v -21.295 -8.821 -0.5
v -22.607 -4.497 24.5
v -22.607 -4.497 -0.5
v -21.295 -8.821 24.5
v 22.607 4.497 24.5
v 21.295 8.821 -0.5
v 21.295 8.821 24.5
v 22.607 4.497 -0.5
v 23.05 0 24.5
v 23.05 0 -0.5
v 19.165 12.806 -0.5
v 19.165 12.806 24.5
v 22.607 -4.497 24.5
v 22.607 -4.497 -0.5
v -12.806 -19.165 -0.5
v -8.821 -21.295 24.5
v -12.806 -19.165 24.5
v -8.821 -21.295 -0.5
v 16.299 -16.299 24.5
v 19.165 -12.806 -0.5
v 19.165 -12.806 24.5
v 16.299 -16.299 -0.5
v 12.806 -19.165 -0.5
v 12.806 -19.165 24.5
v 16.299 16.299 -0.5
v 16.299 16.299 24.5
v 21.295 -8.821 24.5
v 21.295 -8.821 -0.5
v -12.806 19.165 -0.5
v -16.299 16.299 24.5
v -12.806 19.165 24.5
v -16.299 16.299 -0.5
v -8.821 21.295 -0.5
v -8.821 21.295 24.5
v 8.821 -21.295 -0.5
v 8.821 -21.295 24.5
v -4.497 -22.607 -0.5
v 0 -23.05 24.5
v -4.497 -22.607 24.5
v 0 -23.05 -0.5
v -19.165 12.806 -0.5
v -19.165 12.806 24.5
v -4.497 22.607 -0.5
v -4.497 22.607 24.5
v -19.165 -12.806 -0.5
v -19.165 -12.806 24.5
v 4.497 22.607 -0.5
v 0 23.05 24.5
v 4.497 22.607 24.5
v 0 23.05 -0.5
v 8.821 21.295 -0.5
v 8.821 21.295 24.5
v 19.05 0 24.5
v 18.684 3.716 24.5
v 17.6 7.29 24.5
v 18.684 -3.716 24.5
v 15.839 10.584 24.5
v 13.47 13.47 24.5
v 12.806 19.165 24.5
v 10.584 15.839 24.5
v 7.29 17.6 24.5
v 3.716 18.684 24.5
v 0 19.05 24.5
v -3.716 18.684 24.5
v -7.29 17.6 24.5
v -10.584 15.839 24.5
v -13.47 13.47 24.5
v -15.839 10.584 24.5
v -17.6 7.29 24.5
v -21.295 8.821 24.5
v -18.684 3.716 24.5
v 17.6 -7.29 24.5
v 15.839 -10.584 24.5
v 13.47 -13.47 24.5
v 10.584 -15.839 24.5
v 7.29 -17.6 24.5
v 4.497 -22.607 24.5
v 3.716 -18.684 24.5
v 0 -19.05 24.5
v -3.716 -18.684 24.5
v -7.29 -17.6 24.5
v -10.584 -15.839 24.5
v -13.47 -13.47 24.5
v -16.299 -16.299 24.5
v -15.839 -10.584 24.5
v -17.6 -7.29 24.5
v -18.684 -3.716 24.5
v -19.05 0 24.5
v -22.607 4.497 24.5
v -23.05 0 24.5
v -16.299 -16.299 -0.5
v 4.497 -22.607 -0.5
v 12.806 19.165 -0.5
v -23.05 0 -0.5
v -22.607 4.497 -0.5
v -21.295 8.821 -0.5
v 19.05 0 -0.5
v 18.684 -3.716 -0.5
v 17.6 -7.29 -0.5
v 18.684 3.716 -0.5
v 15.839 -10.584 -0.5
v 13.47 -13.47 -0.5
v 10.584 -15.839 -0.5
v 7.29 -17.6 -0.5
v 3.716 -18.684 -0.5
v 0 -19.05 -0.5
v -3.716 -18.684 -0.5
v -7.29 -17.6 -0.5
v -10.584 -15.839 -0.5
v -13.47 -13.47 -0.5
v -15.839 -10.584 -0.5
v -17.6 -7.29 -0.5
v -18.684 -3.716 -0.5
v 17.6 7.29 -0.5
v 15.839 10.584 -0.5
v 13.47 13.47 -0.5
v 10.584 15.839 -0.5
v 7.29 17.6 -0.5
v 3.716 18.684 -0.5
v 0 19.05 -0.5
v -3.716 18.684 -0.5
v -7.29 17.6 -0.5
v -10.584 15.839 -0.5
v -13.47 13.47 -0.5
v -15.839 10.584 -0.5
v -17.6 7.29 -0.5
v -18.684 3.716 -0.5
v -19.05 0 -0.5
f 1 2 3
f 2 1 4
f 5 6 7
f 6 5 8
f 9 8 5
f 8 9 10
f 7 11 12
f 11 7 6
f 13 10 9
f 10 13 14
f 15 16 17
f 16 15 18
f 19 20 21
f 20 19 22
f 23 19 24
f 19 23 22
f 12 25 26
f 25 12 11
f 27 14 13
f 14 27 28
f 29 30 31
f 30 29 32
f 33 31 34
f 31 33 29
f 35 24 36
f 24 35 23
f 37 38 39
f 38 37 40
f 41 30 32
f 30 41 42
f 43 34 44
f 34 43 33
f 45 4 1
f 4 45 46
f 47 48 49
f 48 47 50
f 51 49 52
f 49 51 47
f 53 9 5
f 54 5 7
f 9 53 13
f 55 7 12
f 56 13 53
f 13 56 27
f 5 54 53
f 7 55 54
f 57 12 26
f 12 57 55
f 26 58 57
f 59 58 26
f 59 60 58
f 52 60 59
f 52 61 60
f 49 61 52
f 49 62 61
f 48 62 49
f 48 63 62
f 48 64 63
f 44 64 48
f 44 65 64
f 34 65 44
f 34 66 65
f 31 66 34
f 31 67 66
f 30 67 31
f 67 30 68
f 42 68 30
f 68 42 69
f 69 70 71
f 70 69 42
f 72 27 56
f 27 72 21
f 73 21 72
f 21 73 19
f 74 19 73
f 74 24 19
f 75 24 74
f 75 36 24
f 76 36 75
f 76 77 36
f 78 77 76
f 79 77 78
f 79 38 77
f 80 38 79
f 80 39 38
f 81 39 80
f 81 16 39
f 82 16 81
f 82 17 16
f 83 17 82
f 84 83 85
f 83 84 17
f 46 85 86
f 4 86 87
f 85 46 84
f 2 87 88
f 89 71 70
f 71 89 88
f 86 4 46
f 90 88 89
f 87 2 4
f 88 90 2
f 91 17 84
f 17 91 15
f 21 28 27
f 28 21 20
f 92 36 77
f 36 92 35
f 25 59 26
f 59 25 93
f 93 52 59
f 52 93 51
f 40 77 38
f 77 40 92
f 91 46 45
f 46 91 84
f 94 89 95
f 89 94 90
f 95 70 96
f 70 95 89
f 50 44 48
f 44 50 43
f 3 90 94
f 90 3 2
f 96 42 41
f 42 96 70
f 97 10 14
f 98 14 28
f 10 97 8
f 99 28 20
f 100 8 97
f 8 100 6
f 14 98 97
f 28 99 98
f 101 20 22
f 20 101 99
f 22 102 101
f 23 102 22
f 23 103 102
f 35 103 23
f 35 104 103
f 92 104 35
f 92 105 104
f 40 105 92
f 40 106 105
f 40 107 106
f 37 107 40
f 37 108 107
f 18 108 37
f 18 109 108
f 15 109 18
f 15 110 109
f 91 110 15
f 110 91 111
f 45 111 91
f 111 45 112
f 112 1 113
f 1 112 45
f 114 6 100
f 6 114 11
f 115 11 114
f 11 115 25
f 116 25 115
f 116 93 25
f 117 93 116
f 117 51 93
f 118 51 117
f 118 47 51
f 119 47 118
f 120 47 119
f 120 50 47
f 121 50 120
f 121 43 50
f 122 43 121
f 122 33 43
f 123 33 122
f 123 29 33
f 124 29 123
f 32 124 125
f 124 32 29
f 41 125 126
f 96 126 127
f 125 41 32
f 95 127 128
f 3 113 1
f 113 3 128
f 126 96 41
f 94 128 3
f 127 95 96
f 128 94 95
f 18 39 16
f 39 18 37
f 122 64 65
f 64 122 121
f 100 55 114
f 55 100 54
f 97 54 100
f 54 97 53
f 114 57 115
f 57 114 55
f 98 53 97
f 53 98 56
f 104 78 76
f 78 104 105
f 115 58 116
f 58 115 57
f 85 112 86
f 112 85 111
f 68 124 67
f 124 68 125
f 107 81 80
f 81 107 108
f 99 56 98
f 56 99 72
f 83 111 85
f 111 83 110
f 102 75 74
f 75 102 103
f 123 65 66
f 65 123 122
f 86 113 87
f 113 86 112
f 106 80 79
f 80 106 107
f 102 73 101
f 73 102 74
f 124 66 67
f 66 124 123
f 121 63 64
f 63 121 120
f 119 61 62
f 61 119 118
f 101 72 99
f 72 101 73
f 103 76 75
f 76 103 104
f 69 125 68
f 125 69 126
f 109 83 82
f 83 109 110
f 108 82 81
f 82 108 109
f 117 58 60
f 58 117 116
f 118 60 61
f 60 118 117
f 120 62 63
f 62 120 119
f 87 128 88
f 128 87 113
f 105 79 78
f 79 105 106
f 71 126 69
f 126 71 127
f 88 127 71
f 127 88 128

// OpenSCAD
$fn = 32;

// ----------------------------------------------------------------------
// Two-module gear rim: z12 m2 and z28 m1.2, 24 mm wide
// ----------------------------------------------------------------------

// --- parameters (mm) ---
module_a = 2;             // first tooth module
teeth_a = 12;             // first band tooth count
module_b = 1.2;           // second tooth module
teeth_b = 28;             // second band tooth count
band_h = 10;              // height of one tooth band
web_t = 4;                // web thickness between the bands
total = 24;               // overall width over both bands
root_r = 9.5;             // root radius of the coarse band
hub_r = 23.05;            // hub radius
bore_d = 38.1;            // hub bore
hole_count = 5;           // lightening holes
hole_r = 7.75;            // lightening hole circle radius
hole_d = 4;               // lightening hole diameter

band_a = [[9.4, -1.378], [12.124, -1.51], [13.058, -1.154], [13.986, -0.621], [13.986, 0.621], [13.058, 1.154], [12.124, 1.51], [9.4, 1.378], [8.829, 3.507], [11.254, 4.755], [11.885, 5.53], [12.423, 6.456], [11.802, 7.531], [10.732, 7.528], [9.745, 7.369], [7.451, 5.893], [5.893, 7.451], [7.369, 9.745], [7.528, 10.732], [7.531, 11.802], [6.456, 12.423], [5.53, 11.885], [4.755, 11.254], [3.507, 8.829], [1.378, 9.4], [1.51, 12.124], [1.154, 13.058], [0.621, 13.986], [-0.621, 13.986], [-1.154, 13.058], [-1.51, 12.124], [-1.378, 9.4], [-3.507, 8.829], [-4.755, 11.254], [-5.53, 11.885], [-6.456, 12.423], [-7.531, 11.802], [-7.528, 10.732], [-7.369, 9.745], [-5.893, 7.451], [-7.451, 5.893], [-9.745, 7.369], [-10.732, 7.528], [-11.802, 7.531], [-12.423, 6.456], [-11.885, 5.53], [-11.254, 4.755], [-8.829, 3.507], [-9.4, 1.378], [-12.124, 1.51], [-13.058, 1.154], [-13.986, 0.621], [-13.986, -0.621], [-13.058, -1.154], [-12.124, -1.51], [-9.4, -1.378], [-8.829, -3.507], [-11.254, -4.755], [-11.885, -5.53], [-12.423, -6.456], [-11.802, -7.531], [-10.732, -7.528], [-9.745, -7.369], [-7.451, -5.893], [-5.893, -7.451], [-7.369, -9.745], [-7.528, -10.732], [-7.531, -11.802], [-6.456, -12.423], [-5.53, -11.885], [-4.755, -11.254], [-3.507, -8.829], [-1.378, -9.4], [-1.51, -12.124], [-1.154, -13.058], [-0.621, -13.986], [0.621, -13.986], [1.154, -13.058], [1.51, -12.124], [1.378, -9.4], [3.507, -8.829], [4.755, -11.254], [5.53, -11.885], [6.456, -12.423], [7.531, -11.802], [7.528, -10.732], [7.369, -9.745], [5.893, -7.451], [7.451, -5.893], [9.745, -7.369], [10.732, -7.528], [11.802, -7.531], [12.423, -6.456], [11.885, -5.53], [11.254, -4.755], [8.829, -3.507]];
band_b = [[15.262, -1.083], [16.527, -1.01], [17.262, -0.772], [17.995, -0.439], [17.995, 0.439], [17.262, 0.772], [16.527, 1.01], [15.262, 1.083], [15.12, 2.34], [16.337, 2.693], [17.001, 3.088], [17.641, 3.577], [17.446, 4.432], [16.657, 4.594], [15.888, 4.662], [14.638, 4.452], [14.22, 5.646], [15.329, 6.261], [15.887, 6.794], [16.403, 7.412], [16.022, 8.203], [15.217, 8.185], [14.452, 8.081], [13.28, 7.597], [12.607, 8.669], [13.551, 9.515], [13.977, 10.159], [14.342, 10.877], [13.795, 11.562], [13.014, 11.366], [12.292, 11.094], [11.257, 10.362], [10.362, 11.257], [11.094, 12.292], [11.366, 13.014], [11.562, 13.795], [10.877, 14.342], [10.159, 13.977], [9.515, 13.551], [8.669, 12.607], [7.597, 13.28], [8.081, 14.452], [8.185, 15.217], [8.203, 16.022], [7.412, 16.403], [6.794, 15.887], [6.261, 15.329], [5.646, 14.22], [4.452, 14.638], [4.662, 15.888], [4.594, 16.657], [4.432, 17.446], [3.577, 17.641], [3.088, 17.001], [2.693, 16.337], [2.34, 15.12], [1.083, 15.262], [1.01, 16.527], [0.772, 17.262], [0.439, 17.995], [-0.439, 17.995], [-0.772, 17.262], [-1.01, 16.527], [-1.083, 15.262], [-2.34, 15.12], [-2.693, 16.337], [-3.088, 17.001], [-3.577, 17.641], [-4.432, 17.446], [-4.594, 16.657], [-4.662, 15.888], [-4.452, 14.638], [-5.646, 14.22], [-6.261, 15.329], [-6.794, 15.887], [-7.412, 16.403], [-8.203, 16.022], [-8.185, 15.217], [-8.081, 14.452], [-7.597, 13.28], [-8.669, 12.607], [-9.515, 13.551], [-10.159, 13.977], [-10.877, 14.342], [-11.562, 13.795], [-11.366, 13.014], [-11.094, 12.292], [-10.362, 11.257], [-11.257, 10.362], [-12.292, 11.094], [-13.014, 11.366], [-13.795, 11.562], [-14.342, 10.877], [-13.977, 10.159], [-13.551, 9.515], [-12.607, 8.669], [-13.28, 7.597], [-14.452, 8.081], [-15.217, 8.185], [-16.022, 8.203], [-16.403, 7.412], [-15.887, 6.794], [-15.329, 6.261], [-14.22, 5.646], [-14.638, 4.452], [-15.888, 4.662], [-16.657, 4.594], [-17.446, 4.432], [-17.641, 3.577], [-17.001, 3.088], [-16.337, 2.693], [-15.12, 2.34], [-15.262, 1.083], [-16.527, 1.01], [-17.262, 0.772], [-17.995, 0.439], [-17.995, -0.439], [-17.262, -0.772], [-16.527, -1.01], [-15.262, -1.083], [-15.12, -2.34], [-16.337, -2.693], [-17.001, -3.088], [-17.641, -3.577], [-17.446, -4.432], [-16.657, -4.594], [-15.888, -4.662], [-14.638, -4.452], [-14.22, -5.646], [-15.329, -6.261], [-15.887, -6.794], [-16.403, -7.412], [-16.022, -8.203], [-15.217, -8.185], [-14.452, -8.081], [-13.28, -7.597], [-12.607, -8.669], [-13.551, -9.515], [-13.977, -10.159], [-14.342, -10.877], [-13.795, -11.562], [-13.014, -11.366], [-12.292, -11.094], [-11.257, -10.362], [-10.362, -11.257], [-11.094, -12.292], [-11.366, -13.014], [-11.562, -13.795], [-10.877, -14.342], [-10.159, -13.977], [-9.515, -13.551], [-8.669, -12.607], [-7.597, -13.28], [-8.081, -14.452], [-8.185, -15.217], [-8.203, -16.022], [-7.412, -16.403], [-6.794, -15.887], [-6.261, -15.329], [-5.646, -14.22], [-4.452, -14.638], [-4.662, -15.888], [-4.594, -16.657], [-4.432, -17.446], [-3.577, -17.641], [-3.088, -17.001], [-2.693, -16.337], [-2.34, -15.12], [-1.083, -15.262], [-1.01, -16.527], [-0.772, -17.262], [-0.439, -17.995], [0.439, -17.995], [0.772, -17.262], [1.01, -16.527], [1.083, -15.262], [2.34, -15.12], [2.693, -16.337], [3.088, -17.001], [3.577, -17.641], [4.432, -17.446], [4.594, -16.657], [4.662, -15.888], [4.452, -14.638], [5.646, -14.22], [6.261, -15.329], [6.794, -15.887], [7.412, -16.403], [8.203, -16.022], [8.185, -15.217], [8.081, -14.452], [7.597, -13.28], [8.669, -12.607], [9.515, -13.551], [10.159, -13.977], [10.877, -14.342], [11.562, -13.795], [11.366, -13.014], [11.094, -12.292], [10.362, -11.257], [11.257, -10.362], [12.292, -11.094], [13.014, -11.366], [13.795, -11.562], [14.342, -10.877], [13.977, -10.159], [13.551, -9.515], [12.607, -8.669], [13.28, -7.597], [14.452, -8.081], [15.217, -8.185], [16.022, -8.203], [16.403, -7.412], [15.887, -6.794], [15.329, -6.261], [14.22, -5.646], [14.638, -4.452], [15.888, -4.662], [16.657, -4.594], [17.446, -4.432], [17.641, -3.577], [17.001, -3.088], [16.337, -2.693], [15.12, -2.34]];

difference() {
  union() {
    /* tooth band A, overlapping the web by 0.4 mm */
    linear_extrude(height = band_h + 0.4) polygon(band_a);
    /* web */
    translate([0, 0, band_h - 0.4]) cylinder(h = web_t + 0.8, d = 2 * root_r);
    /* tooth band B */
    translate([0, 0, band_h + web_t]) linear_extrude(height = band_h + 0.4) polygon(band_b);
    /* hub */
    translate([0, 0, -0.5]) cylinder(h = total + 1.0, d = 2 * hub_r);
  }
  /* bore */
  translate([0, 0, -2.5]) cylinder(h = total + 5, d = bore_d);
  /* lightening holes through the web */
  for (i = [0 : hole_count - 1]) {
    a = i * 360 / hole_count;
    translate([hole_r * cos(a), hole_r * sin(a), -2.5]) cylinder(h = total + 5, d = hole_d);
  }
}
